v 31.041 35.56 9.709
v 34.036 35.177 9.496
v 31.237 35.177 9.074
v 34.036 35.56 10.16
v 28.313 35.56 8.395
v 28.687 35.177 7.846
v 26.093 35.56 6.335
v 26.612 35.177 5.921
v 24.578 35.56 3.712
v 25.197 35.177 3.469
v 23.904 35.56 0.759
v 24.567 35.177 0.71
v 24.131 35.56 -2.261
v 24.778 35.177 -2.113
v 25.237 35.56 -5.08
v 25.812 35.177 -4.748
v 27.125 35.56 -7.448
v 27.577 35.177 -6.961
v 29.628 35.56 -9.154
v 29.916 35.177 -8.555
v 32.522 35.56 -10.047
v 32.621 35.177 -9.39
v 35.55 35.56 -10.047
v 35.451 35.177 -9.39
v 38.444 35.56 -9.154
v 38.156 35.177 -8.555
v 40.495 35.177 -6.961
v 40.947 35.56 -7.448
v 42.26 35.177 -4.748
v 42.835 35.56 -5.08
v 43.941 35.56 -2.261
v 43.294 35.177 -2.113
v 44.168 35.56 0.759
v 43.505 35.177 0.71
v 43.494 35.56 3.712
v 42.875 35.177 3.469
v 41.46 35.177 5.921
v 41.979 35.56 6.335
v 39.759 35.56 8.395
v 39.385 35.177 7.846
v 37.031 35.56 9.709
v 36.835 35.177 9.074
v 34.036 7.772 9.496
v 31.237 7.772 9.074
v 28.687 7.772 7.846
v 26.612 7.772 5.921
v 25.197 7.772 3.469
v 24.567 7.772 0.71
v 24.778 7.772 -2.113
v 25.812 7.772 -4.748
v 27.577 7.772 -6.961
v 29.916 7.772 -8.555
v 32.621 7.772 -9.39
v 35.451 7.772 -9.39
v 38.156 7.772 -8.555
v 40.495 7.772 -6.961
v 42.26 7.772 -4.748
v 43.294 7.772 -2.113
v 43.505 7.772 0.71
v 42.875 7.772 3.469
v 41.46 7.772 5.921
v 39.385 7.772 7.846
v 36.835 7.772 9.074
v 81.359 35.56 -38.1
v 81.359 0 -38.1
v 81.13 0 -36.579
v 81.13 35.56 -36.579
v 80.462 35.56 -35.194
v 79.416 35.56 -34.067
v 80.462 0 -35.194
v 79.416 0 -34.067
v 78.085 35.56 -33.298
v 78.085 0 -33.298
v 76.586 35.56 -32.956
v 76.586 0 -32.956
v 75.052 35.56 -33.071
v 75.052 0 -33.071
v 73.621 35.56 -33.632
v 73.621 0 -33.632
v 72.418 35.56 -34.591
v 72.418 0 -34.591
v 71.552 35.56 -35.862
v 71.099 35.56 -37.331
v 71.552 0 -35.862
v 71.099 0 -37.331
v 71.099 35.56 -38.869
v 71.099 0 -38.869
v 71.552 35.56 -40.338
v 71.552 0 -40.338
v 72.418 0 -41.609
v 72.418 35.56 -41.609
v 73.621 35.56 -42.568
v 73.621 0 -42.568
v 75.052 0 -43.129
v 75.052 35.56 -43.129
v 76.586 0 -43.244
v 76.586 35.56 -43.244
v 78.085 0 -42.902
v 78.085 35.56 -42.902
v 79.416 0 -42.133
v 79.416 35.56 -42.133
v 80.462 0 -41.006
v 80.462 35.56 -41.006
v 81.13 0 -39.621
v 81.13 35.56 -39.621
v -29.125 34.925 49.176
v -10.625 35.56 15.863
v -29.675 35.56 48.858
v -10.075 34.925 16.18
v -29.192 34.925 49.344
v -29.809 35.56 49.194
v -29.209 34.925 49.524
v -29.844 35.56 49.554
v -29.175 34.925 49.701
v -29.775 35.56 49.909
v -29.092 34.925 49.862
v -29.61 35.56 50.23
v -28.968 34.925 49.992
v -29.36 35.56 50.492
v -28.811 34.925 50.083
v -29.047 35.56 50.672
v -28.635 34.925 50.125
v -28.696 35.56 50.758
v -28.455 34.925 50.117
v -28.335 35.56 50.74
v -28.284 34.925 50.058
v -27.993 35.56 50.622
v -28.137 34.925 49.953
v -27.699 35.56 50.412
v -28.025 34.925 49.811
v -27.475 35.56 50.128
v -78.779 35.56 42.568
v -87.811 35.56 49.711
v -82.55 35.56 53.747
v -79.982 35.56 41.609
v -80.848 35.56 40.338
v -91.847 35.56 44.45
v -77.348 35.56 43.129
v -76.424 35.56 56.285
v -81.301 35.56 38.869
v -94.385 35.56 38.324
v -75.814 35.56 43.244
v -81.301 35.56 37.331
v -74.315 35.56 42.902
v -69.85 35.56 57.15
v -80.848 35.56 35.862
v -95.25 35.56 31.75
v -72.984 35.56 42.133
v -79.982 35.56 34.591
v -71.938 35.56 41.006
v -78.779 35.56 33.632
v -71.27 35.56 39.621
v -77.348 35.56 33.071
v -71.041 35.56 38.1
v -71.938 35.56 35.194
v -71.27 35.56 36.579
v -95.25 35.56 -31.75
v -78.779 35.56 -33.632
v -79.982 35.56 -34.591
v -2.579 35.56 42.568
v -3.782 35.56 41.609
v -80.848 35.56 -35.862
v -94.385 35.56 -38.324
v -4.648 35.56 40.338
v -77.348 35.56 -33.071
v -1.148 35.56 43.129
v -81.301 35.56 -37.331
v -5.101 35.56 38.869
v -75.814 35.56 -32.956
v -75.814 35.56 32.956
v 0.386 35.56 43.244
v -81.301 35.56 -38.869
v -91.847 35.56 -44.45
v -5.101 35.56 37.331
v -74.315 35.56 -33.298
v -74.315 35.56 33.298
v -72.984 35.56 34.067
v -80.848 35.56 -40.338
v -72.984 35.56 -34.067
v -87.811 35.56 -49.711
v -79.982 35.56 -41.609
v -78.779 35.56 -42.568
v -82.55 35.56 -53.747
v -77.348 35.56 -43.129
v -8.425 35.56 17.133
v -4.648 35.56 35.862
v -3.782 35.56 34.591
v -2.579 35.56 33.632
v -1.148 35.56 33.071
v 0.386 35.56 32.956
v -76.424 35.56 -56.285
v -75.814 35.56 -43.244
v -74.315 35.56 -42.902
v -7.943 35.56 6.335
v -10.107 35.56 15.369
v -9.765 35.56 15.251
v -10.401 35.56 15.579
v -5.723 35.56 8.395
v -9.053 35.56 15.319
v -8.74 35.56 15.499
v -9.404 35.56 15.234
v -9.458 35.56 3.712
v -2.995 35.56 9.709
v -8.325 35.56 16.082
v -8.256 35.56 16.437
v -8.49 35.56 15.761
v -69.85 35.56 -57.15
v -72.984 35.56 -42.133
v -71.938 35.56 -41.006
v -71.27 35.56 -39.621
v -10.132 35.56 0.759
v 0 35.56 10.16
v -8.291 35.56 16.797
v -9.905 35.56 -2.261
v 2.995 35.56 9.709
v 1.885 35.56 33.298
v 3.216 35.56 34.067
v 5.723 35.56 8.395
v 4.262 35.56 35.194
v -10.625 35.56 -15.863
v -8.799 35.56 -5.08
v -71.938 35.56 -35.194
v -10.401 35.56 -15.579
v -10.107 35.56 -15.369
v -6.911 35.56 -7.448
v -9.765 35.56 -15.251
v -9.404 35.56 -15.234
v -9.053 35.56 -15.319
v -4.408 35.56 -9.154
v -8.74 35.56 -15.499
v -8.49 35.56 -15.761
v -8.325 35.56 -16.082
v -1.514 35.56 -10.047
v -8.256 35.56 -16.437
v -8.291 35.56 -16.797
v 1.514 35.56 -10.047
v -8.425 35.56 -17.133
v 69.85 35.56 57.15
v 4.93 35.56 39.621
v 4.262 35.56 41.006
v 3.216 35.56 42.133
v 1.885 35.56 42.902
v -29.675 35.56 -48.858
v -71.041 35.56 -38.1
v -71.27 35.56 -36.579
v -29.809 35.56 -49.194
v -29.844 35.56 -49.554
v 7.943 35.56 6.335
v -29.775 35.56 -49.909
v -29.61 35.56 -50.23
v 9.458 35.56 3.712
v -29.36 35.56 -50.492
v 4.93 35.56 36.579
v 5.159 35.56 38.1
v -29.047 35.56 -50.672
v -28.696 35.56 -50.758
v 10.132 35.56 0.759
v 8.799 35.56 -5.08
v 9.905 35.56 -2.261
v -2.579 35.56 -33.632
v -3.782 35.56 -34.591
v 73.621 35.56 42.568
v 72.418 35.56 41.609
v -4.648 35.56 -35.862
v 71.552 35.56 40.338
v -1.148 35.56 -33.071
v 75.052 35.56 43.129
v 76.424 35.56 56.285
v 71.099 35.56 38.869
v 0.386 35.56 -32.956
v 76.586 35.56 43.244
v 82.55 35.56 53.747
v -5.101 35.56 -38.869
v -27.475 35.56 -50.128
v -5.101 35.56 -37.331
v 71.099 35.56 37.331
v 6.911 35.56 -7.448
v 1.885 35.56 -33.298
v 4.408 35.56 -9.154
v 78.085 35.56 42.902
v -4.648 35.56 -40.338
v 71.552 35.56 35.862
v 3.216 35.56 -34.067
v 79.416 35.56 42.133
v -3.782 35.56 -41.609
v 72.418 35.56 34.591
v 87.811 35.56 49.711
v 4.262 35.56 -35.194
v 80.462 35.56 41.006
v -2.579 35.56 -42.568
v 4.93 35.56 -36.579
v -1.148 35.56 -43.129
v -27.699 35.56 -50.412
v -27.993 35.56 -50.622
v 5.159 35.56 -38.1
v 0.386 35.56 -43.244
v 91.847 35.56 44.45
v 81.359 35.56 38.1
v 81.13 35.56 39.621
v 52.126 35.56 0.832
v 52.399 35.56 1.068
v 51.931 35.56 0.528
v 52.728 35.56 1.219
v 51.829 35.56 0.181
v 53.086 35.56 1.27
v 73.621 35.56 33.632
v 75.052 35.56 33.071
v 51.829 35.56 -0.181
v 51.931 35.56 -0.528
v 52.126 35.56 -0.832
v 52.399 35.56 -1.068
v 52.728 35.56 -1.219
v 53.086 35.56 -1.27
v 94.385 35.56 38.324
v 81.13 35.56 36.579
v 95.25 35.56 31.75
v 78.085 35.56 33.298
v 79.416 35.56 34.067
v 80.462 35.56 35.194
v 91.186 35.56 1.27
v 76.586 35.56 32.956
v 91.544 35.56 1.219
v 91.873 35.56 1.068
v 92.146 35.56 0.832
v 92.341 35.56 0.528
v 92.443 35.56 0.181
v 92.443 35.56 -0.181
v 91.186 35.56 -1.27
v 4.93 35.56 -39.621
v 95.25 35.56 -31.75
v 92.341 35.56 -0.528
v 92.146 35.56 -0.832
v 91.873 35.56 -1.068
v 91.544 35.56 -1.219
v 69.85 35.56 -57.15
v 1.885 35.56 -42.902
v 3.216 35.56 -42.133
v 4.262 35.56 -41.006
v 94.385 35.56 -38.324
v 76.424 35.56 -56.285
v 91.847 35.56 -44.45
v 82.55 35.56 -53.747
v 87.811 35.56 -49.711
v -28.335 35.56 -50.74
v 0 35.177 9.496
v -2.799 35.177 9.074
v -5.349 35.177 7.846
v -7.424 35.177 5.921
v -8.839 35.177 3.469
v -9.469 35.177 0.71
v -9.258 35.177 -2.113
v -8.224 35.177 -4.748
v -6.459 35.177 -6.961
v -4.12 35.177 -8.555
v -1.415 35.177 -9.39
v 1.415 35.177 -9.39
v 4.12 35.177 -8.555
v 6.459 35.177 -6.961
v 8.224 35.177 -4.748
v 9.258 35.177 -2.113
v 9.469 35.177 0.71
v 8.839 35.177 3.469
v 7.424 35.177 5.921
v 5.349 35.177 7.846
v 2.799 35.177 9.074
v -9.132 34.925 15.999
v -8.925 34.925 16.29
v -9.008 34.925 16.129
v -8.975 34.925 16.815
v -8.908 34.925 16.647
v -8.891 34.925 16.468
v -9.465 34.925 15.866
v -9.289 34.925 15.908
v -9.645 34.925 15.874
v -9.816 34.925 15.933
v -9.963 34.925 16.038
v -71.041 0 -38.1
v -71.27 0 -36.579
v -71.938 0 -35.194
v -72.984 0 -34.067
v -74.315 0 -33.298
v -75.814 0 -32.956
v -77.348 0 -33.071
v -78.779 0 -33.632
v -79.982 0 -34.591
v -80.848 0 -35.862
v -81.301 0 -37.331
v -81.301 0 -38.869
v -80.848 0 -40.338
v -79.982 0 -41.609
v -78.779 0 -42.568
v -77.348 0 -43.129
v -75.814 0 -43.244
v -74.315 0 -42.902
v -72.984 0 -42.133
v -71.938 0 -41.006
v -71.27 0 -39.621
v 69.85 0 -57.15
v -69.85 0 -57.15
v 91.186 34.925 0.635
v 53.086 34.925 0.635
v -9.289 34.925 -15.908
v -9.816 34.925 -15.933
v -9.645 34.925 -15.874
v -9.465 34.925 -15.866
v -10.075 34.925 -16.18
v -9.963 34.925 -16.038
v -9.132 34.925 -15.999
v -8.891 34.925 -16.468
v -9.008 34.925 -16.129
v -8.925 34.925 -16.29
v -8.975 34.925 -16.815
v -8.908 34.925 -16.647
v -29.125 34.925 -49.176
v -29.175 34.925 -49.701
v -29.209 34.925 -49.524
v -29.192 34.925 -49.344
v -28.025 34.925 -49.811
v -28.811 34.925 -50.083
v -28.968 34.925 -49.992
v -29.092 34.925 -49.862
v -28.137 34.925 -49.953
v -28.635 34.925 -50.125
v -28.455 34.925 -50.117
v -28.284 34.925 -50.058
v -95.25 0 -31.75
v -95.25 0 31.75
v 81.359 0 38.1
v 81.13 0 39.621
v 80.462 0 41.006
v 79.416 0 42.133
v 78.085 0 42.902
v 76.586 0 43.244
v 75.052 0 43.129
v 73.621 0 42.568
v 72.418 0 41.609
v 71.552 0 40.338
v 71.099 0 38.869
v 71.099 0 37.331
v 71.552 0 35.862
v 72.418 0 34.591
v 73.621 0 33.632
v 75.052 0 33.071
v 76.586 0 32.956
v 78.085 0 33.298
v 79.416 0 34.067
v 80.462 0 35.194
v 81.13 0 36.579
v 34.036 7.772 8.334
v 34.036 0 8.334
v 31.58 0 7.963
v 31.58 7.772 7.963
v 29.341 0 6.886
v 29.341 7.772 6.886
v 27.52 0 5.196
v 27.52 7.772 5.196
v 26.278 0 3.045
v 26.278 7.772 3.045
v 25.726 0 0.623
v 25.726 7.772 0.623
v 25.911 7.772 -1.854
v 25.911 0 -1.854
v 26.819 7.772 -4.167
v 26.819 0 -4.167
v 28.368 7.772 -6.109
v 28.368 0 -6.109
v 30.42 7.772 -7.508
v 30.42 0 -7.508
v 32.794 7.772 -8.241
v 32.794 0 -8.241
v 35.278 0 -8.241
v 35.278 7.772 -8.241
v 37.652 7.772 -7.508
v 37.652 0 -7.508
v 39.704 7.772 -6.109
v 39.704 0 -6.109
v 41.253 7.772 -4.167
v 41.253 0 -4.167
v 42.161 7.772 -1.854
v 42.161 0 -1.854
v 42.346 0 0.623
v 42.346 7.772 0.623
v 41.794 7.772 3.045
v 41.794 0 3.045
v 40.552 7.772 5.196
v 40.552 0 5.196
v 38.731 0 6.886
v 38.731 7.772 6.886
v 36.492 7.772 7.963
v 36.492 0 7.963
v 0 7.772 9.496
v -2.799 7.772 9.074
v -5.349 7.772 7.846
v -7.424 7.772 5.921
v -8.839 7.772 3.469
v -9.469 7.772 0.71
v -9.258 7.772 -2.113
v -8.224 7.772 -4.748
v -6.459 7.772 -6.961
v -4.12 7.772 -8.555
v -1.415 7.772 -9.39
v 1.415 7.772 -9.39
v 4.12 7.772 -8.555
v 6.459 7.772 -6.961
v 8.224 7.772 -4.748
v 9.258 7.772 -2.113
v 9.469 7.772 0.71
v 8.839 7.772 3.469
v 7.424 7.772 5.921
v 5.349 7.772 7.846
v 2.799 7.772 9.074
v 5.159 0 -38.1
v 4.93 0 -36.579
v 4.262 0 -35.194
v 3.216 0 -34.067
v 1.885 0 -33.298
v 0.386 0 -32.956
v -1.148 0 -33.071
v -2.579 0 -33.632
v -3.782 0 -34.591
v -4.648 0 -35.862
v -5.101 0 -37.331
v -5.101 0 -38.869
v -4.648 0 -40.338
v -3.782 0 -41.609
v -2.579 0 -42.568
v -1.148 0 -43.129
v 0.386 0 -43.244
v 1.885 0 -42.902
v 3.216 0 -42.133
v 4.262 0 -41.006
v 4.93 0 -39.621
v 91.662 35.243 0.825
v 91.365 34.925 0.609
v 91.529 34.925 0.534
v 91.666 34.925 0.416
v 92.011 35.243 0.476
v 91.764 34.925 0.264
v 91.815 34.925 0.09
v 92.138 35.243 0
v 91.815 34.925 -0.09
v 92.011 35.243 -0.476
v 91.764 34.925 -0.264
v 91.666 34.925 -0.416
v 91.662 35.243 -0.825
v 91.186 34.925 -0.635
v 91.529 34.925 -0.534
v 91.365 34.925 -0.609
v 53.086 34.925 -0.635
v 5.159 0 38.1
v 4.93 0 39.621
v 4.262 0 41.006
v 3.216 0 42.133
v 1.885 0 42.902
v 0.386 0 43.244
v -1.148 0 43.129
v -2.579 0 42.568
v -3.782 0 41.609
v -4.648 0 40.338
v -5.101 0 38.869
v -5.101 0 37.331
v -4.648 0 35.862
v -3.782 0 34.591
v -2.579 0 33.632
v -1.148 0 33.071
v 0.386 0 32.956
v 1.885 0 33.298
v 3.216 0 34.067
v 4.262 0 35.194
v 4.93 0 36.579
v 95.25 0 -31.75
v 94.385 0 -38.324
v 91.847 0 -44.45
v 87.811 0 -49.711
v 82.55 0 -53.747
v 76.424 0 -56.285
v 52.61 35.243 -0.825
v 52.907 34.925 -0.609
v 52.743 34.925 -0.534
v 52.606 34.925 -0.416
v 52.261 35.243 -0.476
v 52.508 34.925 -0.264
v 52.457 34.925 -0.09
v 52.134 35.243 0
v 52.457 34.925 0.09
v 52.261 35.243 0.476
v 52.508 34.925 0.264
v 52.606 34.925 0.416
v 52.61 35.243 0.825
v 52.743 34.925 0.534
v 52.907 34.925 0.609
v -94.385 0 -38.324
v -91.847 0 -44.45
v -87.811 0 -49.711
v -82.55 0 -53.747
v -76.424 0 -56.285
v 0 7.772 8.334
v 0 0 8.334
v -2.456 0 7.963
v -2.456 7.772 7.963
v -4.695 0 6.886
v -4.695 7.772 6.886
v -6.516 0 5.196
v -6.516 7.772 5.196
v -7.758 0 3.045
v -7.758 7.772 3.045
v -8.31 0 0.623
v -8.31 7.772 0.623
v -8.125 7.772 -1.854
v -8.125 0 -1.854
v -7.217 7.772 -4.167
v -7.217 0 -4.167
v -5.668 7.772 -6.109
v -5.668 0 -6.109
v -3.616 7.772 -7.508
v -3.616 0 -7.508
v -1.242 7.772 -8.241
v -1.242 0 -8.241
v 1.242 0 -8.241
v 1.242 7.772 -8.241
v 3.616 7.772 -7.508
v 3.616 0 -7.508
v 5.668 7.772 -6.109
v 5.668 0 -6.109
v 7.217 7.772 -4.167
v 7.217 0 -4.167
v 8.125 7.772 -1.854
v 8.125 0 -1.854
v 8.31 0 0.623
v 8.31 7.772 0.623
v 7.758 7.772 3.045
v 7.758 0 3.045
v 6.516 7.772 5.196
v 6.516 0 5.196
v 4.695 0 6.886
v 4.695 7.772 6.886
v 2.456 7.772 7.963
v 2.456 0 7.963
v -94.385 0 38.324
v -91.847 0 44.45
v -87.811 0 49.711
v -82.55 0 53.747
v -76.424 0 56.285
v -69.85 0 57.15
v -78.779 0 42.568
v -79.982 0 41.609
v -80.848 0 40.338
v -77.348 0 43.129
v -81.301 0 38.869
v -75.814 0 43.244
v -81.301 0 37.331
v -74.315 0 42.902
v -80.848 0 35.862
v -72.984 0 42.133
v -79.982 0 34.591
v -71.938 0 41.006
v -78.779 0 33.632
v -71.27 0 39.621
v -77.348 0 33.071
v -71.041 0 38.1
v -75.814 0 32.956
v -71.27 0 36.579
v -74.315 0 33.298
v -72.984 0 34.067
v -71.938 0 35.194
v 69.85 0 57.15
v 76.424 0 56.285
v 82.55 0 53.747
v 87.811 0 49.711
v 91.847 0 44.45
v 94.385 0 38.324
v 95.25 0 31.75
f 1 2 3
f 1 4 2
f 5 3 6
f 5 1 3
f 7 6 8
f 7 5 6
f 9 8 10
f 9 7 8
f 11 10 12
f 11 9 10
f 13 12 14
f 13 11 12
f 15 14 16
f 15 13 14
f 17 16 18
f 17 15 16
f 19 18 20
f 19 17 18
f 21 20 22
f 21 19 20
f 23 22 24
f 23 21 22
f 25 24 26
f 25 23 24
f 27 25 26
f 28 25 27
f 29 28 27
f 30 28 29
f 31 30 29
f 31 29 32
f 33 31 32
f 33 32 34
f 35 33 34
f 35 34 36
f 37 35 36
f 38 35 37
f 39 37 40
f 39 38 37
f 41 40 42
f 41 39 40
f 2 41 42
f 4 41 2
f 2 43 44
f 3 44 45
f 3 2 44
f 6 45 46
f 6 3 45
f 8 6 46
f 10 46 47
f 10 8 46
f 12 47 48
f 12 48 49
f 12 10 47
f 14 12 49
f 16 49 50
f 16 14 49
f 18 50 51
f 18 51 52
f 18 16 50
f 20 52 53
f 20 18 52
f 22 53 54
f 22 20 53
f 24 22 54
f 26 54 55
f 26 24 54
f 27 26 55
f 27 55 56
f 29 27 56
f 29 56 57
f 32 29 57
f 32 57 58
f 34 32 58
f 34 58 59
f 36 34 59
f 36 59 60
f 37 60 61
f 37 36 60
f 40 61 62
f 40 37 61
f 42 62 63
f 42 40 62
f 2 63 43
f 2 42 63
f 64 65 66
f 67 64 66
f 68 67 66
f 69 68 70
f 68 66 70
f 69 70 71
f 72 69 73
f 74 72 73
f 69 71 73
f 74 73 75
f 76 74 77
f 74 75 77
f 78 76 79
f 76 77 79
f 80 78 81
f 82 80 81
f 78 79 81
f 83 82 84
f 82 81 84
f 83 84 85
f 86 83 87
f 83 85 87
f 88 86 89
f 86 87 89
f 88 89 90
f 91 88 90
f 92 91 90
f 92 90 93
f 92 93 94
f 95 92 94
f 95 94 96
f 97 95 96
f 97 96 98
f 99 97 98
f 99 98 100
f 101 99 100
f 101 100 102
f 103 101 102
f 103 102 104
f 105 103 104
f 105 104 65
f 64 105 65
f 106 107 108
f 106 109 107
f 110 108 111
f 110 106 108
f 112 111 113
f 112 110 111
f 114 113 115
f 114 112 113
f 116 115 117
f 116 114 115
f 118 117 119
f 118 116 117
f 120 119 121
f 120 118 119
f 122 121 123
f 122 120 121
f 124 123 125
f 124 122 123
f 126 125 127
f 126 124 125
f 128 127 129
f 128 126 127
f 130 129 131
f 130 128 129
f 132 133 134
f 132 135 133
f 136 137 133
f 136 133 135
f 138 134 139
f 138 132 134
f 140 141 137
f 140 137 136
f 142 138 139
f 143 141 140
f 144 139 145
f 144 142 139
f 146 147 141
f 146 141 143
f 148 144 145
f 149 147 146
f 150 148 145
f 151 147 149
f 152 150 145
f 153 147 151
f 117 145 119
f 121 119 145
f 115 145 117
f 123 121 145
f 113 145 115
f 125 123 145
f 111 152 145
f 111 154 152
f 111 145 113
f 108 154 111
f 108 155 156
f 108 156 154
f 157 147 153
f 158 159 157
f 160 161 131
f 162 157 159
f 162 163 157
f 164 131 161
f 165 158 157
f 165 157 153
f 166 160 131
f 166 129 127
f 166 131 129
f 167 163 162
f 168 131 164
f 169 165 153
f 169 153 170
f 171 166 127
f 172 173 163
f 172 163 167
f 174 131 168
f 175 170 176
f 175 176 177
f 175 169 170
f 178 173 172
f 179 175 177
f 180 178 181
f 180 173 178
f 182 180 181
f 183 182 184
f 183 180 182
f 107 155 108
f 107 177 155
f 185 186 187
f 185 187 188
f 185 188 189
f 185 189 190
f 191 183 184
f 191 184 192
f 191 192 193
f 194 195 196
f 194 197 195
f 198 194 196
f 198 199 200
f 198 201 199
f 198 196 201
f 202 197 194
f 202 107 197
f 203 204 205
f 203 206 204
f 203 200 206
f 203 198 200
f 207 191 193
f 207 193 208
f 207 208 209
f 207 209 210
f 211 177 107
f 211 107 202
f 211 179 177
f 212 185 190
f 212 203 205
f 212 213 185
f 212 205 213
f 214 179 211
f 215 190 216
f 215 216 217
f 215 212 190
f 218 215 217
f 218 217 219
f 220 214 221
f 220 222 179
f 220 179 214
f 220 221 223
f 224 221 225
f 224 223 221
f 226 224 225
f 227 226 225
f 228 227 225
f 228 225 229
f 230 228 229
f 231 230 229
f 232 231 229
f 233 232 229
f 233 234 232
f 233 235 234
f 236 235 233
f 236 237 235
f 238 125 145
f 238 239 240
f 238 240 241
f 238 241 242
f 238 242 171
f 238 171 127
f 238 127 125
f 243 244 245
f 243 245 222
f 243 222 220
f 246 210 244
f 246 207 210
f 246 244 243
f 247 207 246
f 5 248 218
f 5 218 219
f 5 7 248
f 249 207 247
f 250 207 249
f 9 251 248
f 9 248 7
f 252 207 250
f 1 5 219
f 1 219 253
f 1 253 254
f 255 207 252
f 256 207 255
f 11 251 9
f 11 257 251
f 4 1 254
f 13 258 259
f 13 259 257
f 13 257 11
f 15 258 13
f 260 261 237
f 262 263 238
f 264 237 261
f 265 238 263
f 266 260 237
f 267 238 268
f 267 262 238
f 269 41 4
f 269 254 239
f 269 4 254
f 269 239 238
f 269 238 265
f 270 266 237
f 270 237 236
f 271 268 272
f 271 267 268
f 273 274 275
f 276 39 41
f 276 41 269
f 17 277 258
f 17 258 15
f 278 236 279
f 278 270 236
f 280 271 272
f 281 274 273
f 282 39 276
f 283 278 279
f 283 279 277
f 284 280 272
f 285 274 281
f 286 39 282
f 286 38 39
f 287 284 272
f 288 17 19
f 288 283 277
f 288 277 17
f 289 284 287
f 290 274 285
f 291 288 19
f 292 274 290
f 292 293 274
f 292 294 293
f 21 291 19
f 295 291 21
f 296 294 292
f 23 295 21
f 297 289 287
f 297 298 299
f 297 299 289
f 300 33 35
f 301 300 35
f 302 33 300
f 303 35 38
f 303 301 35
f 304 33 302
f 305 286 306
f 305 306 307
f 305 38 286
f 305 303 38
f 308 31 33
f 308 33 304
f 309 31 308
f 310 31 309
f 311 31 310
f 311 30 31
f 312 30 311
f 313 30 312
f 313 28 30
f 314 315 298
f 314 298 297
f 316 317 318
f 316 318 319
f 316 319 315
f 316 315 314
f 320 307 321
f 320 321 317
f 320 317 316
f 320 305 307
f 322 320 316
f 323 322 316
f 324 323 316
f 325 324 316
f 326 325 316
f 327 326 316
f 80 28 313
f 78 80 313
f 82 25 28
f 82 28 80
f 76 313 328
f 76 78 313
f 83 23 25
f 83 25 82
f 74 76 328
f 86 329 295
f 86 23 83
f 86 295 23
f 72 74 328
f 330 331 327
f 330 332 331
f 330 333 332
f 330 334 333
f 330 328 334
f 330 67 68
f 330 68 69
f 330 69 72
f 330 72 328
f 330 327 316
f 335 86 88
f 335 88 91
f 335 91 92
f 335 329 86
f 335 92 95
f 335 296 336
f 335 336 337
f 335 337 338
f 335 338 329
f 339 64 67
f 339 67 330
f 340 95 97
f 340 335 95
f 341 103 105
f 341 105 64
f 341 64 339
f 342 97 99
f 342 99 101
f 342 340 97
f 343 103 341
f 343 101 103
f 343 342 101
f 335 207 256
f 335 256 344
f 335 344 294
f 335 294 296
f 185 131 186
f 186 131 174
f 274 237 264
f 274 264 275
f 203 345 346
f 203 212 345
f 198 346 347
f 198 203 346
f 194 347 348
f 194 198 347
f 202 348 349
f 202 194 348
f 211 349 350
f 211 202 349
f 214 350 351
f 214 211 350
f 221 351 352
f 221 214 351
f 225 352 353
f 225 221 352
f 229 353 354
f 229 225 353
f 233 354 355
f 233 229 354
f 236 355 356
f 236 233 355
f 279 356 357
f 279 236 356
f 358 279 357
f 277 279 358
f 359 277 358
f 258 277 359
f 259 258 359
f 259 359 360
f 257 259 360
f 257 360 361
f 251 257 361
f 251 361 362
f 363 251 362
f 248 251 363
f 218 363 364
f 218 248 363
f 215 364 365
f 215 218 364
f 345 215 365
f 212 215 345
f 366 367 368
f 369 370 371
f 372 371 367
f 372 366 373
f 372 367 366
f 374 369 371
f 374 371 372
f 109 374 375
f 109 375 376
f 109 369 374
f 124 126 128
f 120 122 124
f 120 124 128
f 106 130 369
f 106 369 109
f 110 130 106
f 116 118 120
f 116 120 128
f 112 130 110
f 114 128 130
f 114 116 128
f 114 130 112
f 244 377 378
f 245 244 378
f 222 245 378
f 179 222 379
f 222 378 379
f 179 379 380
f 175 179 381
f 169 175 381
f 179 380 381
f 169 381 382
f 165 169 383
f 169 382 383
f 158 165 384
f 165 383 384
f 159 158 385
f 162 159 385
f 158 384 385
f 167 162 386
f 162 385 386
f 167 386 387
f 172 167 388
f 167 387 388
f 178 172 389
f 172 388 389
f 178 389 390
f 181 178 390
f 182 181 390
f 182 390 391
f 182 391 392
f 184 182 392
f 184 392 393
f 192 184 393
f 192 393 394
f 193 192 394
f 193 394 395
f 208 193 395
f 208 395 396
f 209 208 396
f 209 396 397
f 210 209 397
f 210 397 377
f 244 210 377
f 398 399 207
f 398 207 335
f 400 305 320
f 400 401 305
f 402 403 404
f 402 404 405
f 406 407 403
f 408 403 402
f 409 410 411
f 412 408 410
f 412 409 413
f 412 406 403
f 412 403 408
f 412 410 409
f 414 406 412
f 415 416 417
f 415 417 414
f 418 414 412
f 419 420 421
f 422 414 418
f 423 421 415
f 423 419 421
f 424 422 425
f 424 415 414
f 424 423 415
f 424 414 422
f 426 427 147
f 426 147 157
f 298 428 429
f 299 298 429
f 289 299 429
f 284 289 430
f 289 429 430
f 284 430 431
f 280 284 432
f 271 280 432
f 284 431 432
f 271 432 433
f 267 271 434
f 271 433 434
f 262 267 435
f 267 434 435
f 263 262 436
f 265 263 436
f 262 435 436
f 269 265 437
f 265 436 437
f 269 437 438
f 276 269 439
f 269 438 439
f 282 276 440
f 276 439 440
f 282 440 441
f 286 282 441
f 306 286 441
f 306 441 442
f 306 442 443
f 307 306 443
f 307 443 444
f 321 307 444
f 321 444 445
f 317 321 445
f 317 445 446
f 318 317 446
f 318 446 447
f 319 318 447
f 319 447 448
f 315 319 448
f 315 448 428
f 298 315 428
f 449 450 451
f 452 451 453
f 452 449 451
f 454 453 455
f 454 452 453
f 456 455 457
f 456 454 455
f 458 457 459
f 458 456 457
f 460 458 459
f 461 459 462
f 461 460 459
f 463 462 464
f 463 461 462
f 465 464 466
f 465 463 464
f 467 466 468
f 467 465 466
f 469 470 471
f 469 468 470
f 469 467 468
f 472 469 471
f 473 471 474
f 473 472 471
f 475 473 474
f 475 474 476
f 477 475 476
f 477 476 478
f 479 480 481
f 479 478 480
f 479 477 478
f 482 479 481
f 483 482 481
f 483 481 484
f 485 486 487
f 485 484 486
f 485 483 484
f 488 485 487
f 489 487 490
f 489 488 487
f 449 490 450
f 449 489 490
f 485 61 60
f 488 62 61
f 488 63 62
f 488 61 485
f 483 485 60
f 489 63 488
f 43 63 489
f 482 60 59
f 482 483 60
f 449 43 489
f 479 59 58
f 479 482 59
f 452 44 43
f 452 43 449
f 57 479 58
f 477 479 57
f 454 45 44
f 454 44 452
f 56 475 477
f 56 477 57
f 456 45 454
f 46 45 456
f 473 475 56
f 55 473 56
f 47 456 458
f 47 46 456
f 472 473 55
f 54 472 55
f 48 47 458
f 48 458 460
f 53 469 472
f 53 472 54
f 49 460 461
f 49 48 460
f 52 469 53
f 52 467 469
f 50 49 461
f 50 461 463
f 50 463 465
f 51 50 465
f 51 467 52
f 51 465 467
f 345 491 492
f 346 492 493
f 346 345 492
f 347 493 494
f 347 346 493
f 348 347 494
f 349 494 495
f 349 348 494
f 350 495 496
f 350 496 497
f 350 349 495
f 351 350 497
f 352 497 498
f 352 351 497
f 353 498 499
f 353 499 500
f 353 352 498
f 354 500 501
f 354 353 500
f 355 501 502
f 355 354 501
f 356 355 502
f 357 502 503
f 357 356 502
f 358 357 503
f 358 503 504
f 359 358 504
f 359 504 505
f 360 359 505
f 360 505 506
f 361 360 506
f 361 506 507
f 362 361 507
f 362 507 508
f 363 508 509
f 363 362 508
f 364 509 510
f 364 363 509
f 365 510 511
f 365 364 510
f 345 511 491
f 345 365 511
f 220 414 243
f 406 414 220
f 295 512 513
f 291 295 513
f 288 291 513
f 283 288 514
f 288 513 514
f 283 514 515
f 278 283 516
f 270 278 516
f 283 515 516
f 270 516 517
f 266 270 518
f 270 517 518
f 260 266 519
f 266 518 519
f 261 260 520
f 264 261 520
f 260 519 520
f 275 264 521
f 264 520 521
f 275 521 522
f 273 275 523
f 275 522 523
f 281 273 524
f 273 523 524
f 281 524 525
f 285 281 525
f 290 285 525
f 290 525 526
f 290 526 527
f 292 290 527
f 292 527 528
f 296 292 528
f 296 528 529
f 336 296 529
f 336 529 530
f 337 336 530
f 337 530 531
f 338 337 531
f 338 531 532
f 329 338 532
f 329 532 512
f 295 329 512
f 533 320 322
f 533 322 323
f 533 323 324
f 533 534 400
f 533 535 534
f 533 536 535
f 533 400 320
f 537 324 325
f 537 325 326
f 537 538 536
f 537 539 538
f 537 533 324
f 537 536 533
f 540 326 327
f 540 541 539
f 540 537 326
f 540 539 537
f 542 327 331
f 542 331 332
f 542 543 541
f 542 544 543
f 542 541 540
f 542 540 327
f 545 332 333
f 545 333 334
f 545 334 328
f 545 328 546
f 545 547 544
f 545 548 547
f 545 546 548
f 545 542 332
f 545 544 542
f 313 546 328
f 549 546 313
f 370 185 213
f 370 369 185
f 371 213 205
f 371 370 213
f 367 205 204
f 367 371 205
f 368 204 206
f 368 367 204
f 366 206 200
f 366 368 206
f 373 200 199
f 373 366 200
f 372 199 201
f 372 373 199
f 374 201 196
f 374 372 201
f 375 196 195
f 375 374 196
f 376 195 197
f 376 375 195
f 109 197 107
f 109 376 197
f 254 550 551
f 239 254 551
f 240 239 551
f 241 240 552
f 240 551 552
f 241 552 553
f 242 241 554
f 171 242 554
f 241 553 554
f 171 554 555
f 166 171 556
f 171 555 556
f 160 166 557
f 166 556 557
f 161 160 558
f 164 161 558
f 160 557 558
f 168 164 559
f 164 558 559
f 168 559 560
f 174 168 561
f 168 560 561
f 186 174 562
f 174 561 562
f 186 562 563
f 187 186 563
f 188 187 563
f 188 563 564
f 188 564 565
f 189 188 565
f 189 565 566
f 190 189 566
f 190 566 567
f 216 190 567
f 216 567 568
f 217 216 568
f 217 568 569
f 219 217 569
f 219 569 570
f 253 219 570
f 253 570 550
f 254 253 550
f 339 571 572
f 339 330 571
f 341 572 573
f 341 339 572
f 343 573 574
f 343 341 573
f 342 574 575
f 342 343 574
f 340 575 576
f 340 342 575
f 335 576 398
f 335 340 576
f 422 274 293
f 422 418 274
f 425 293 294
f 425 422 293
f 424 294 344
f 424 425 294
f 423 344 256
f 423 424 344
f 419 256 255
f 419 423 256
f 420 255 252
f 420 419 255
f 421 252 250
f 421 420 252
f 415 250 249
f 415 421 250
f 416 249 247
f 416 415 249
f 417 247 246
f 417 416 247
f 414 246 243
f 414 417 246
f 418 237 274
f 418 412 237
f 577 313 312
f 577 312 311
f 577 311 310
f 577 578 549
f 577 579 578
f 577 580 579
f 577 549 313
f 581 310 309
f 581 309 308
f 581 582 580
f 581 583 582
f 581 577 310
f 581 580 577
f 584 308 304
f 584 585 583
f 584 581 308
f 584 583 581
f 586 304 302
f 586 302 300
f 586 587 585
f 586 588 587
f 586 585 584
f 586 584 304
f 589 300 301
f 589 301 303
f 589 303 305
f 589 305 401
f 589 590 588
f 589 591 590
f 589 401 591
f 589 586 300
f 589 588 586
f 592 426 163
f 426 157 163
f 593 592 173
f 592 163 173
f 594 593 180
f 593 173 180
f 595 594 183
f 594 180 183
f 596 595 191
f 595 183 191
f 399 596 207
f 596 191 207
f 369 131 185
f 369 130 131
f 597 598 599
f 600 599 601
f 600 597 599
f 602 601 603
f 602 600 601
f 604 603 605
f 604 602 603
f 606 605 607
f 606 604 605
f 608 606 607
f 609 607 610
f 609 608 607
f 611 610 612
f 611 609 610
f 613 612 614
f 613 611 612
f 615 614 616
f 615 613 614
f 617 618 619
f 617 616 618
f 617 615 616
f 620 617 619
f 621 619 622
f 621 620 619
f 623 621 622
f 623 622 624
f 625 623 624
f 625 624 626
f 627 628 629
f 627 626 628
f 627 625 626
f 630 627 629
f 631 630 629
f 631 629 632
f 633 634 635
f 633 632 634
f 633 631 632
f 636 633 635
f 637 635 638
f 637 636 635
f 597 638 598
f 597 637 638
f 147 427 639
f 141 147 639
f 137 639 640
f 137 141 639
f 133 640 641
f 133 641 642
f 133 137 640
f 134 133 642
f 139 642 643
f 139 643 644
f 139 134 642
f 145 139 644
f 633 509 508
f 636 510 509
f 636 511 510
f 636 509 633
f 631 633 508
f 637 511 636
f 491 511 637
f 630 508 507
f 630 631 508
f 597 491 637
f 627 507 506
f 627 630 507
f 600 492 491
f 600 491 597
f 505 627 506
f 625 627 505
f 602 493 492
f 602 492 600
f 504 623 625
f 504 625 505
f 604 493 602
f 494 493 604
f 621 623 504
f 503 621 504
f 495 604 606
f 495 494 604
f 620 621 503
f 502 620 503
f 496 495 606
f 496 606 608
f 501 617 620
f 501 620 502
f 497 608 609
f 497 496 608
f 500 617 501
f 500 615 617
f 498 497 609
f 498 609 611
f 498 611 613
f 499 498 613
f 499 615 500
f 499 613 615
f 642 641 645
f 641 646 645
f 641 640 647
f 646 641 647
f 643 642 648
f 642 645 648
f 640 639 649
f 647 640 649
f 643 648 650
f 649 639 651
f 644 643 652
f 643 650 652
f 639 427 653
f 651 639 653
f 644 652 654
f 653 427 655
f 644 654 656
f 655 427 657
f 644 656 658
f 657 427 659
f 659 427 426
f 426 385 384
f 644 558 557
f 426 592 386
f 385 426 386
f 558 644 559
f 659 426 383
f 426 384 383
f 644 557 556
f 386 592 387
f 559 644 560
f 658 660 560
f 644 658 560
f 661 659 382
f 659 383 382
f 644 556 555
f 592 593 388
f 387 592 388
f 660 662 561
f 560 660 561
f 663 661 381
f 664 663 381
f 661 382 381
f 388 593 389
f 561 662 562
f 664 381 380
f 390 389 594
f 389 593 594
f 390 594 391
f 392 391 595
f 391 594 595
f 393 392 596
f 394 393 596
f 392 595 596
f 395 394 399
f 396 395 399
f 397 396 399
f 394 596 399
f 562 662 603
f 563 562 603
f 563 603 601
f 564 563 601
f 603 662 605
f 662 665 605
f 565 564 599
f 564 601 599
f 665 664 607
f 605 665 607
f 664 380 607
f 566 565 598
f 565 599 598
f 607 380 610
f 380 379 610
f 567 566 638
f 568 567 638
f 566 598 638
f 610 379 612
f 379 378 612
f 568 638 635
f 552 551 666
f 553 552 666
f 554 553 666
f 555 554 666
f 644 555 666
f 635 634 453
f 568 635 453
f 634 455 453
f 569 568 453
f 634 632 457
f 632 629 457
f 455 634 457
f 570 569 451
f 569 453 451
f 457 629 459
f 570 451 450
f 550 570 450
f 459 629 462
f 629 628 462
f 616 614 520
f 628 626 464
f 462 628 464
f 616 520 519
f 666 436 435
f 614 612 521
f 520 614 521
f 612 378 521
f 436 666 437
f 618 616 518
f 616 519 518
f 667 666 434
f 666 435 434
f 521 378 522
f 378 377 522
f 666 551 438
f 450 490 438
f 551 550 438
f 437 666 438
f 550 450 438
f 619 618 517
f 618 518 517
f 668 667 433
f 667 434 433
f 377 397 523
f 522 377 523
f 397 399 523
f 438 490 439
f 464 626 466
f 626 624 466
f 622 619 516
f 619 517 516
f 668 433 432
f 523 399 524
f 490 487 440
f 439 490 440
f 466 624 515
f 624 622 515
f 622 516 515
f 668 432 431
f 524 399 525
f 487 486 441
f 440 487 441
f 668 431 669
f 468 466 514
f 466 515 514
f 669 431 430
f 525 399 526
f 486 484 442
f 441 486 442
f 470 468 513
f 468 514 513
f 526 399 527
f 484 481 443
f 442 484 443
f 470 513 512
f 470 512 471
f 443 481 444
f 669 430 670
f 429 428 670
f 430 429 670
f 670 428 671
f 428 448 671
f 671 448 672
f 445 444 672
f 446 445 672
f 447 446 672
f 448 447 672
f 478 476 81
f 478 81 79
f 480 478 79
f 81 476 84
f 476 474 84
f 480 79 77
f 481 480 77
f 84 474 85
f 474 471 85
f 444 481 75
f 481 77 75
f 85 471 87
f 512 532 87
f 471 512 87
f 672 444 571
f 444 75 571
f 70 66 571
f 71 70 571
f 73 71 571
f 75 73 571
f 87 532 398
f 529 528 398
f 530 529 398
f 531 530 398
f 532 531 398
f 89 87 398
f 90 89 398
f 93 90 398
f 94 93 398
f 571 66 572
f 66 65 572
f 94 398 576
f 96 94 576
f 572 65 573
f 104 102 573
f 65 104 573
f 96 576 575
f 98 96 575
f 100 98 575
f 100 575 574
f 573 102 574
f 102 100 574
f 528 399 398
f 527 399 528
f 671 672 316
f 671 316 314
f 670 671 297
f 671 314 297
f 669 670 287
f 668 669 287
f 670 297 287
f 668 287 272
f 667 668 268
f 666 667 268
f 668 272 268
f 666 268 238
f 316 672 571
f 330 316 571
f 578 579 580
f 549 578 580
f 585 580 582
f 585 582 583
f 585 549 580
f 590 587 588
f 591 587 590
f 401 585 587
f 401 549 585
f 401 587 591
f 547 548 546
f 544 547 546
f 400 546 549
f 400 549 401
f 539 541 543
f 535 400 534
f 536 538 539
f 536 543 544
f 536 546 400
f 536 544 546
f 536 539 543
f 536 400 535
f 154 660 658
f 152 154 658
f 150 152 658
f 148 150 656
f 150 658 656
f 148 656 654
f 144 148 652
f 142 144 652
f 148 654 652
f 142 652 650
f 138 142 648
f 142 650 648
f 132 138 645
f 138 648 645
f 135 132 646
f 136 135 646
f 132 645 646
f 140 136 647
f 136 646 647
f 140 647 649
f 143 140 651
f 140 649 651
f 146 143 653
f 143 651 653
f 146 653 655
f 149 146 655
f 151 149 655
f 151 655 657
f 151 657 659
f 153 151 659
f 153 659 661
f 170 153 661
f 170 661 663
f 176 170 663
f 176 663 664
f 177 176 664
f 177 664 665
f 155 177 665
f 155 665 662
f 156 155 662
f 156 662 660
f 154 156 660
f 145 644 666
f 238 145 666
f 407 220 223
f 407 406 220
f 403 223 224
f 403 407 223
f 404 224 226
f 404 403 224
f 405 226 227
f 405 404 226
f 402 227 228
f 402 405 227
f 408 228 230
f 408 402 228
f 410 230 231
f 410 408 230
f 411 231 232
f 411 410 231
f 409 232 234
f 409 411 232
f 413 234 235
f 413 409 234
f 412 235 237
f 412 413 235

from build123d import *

# Parameters (mm, degrees)
SKETCH1_W                                   = 190.5
SKETCH1_H                                   = 114.3
EXTRUDE1_DEPTH                              = 35.56
F_3_8_CLEARANCE_HOLE1_D                     = 10.31748
LPATTERN6_COUNT                             = 3
LPATTERN6_PITCH                             = 76.2
LPATTERN6_COUNT_DIR2                        = 2
LPATTERN6_PITCH_DIR2                        = 76.2
F_5_8_11_TAPPED_HOLE1_D                     = 15.875
F_5_8_11_TAPPED_HOLE1_CSINK_D               = 17.145
F_5_8_11_TAPPED_HOLE1_CSINK_ANGLE           = 120
FILLET1_R                                   = 25.4
EXTRUDE2_DEPTH                              = 0.635
EXTRUDE2_TAPER                              = 45
TAPPED_HOLE_FOR_5_8_11_HELICOIL2_AT_2_COUNT = 2
TAPPED_HOLE_FOR_5_8_11_HELICOIL2_AT_2_PITCH = 34.036


with BuildPart() as part:
    # Sketch1 → Extrude1 (new body)
    with BuildSketch(Plane(origin=(0, 0, 0), x_dir=(1, 0, 0), z_dir=(0, 1, 0))):
        Rectangle(SKETCH1_W, SKETCH1_H)
    extrude(amount=EXTRUDE1_DEPTH)

    # 3/8 Clearance Hole1 (through all)
    with Locations(Plane(origin=(0, 35.56, 0), x_dir=(-1, 0, 0), z_dir=(0, 1, 0))):
        with Locations((76.2, -38.1)):
            f_3_8_clearance_hole1 = Hole(F_3_8_CLEARANCE_HOLE1_D / 2)

    # LPattern6: 3_8 Clearance Hole1 3 × 2
    with Locations(*[(i * LPATTERN6_PITCH, 0, j * LPATTERN6_PITCH_DIR2) for i in range(LPATTERN6_COUNT) for j in range(LPATTERN6_COUNT_DIR2) if (i, j) != (0, 0)]):
        add(f_3_8_clearance_hole1, mode=Mode.SUBTRACT)

    # 5/8-11 Tapped Hole1 (through all)
    with Locations(Plane(origin=(0, 35.56, 0), x_dir=(-1, 0, 0), z_dir=(0, 1, 0))):
        with Locations((0, 0), (-34.036, 0)):
            CounterSinkHole(F_5_8_11_TAPPED_HOLE1_D / 2, F_5_8_11_TAPPED_HOLE1_CSINK_D / 2, counter_sink_angle=F_5_8_11_TAPPED_HOLE1_CSINK_ANGLE)

    # Fillet1
    fillet1_edges = [part.edges().sort_by_distance(p)[0] for p in [
        (95.25, 17.78, 57.15),
        (-95.25, 17.78, 57.15),
        (-95.25, 17.78, -57.15),
        (95.25, 17.78, -57.15),
    ]]
    fillet(fillet1_edges, radius=FILLET1_R)

    # Sketch6 → Extrude2 (cut)
    with BuildSketch(Plane(origin=(0, 35.56, 0), x_dir=(1, 0, 0), z_dir=(0, 1, 0))):
        with BuildLine():
            Line((-8.425147737, 17.132783942), (-27.475147737, 50.128351826))
            ThreePointArc((-27.475147737, 50.128351826), (-29.21, 50.593204089), (-29.674852263, 48.858351826))
            Line((-29.674852263, 48.858351826), (-10.624852263, 15.862783942))
            ThreePointArc((-10.624852263, 15.862783942), (-8.89, 15.397931679), (-8.425147737, 17.132783942))
        make_face()
        with BuildLine():
            Line((-10.624852263, -15.862783942), (-29.674852263, -48.858351826))
            ThreePointArc((-29.674852263, -48.858351826), (-29.21, -50.593204089), (-27.475147737, -50.128351826))
            Line((-27.475147737, -50.128351826), (-8.425147737, -17.132783942))
            ThreePointArc((-8.425147737, -17.132783942), (-8.89, -15.397931679), (-10.624852263, -15.862783942))
        make_face()
        with BuildLine():
            Line((53.086, -1.27), (91.186, -1.27))
            ThreePointArc((91.186, -1.27), (92.456, 0), (91.186, 1.27))
            Line((91.186, 1.27), (53.086, 1.27))
            ThreePointArc((53.086, 1.27), (51.816, 0), (53.086, -1.27))
        make_face()
    extrude(amount=-EXTRUDE2_DEPTH, taper=EXTRUDE2_TAPER, mode=Mode.SUBTRACT)

    # Sketch9 → Tapped Hole for 5/8-11 Helicoil2 (revolve, cut)
    with BuildSketch(Plane(origin=(0, 35.56, 0), x_dir=(0, 0, 1), z_dir=(1, 0, 0))):
        Polygon((0, 0), (0, 43.056616175), (8.33374, 38.0492), (8.33374, 27.7876), (9.49579, 27.7876), (9.49579, 0.383481822), (10.16, 0), align=None)
    tapped_hole_for_5_8_11_helicoil2 = revolve(axis=Axis((0, 41.91, 0), (0, -1, 0)), mode=Mode.SUBTRACT)

    # Tapped Hole for 5/8-11 Helicoil2 at 2: Tapped Hole for 5/8-11 Helicoil2 ×2
    with Locations(*[(i * TAPPED_HOLE_FOR_5_8_11_HELICOIL2_AT_2_PITCH, 0, 0) for i in range(1, TAPPED_HOLE_FOR_5_8_11_HELICOIL2_AT_2_COUNT)]):
        add(tapped_hole_for_5_8_11_helicoil2, mode=Mode.SUBTRACT)


solid = part.part
